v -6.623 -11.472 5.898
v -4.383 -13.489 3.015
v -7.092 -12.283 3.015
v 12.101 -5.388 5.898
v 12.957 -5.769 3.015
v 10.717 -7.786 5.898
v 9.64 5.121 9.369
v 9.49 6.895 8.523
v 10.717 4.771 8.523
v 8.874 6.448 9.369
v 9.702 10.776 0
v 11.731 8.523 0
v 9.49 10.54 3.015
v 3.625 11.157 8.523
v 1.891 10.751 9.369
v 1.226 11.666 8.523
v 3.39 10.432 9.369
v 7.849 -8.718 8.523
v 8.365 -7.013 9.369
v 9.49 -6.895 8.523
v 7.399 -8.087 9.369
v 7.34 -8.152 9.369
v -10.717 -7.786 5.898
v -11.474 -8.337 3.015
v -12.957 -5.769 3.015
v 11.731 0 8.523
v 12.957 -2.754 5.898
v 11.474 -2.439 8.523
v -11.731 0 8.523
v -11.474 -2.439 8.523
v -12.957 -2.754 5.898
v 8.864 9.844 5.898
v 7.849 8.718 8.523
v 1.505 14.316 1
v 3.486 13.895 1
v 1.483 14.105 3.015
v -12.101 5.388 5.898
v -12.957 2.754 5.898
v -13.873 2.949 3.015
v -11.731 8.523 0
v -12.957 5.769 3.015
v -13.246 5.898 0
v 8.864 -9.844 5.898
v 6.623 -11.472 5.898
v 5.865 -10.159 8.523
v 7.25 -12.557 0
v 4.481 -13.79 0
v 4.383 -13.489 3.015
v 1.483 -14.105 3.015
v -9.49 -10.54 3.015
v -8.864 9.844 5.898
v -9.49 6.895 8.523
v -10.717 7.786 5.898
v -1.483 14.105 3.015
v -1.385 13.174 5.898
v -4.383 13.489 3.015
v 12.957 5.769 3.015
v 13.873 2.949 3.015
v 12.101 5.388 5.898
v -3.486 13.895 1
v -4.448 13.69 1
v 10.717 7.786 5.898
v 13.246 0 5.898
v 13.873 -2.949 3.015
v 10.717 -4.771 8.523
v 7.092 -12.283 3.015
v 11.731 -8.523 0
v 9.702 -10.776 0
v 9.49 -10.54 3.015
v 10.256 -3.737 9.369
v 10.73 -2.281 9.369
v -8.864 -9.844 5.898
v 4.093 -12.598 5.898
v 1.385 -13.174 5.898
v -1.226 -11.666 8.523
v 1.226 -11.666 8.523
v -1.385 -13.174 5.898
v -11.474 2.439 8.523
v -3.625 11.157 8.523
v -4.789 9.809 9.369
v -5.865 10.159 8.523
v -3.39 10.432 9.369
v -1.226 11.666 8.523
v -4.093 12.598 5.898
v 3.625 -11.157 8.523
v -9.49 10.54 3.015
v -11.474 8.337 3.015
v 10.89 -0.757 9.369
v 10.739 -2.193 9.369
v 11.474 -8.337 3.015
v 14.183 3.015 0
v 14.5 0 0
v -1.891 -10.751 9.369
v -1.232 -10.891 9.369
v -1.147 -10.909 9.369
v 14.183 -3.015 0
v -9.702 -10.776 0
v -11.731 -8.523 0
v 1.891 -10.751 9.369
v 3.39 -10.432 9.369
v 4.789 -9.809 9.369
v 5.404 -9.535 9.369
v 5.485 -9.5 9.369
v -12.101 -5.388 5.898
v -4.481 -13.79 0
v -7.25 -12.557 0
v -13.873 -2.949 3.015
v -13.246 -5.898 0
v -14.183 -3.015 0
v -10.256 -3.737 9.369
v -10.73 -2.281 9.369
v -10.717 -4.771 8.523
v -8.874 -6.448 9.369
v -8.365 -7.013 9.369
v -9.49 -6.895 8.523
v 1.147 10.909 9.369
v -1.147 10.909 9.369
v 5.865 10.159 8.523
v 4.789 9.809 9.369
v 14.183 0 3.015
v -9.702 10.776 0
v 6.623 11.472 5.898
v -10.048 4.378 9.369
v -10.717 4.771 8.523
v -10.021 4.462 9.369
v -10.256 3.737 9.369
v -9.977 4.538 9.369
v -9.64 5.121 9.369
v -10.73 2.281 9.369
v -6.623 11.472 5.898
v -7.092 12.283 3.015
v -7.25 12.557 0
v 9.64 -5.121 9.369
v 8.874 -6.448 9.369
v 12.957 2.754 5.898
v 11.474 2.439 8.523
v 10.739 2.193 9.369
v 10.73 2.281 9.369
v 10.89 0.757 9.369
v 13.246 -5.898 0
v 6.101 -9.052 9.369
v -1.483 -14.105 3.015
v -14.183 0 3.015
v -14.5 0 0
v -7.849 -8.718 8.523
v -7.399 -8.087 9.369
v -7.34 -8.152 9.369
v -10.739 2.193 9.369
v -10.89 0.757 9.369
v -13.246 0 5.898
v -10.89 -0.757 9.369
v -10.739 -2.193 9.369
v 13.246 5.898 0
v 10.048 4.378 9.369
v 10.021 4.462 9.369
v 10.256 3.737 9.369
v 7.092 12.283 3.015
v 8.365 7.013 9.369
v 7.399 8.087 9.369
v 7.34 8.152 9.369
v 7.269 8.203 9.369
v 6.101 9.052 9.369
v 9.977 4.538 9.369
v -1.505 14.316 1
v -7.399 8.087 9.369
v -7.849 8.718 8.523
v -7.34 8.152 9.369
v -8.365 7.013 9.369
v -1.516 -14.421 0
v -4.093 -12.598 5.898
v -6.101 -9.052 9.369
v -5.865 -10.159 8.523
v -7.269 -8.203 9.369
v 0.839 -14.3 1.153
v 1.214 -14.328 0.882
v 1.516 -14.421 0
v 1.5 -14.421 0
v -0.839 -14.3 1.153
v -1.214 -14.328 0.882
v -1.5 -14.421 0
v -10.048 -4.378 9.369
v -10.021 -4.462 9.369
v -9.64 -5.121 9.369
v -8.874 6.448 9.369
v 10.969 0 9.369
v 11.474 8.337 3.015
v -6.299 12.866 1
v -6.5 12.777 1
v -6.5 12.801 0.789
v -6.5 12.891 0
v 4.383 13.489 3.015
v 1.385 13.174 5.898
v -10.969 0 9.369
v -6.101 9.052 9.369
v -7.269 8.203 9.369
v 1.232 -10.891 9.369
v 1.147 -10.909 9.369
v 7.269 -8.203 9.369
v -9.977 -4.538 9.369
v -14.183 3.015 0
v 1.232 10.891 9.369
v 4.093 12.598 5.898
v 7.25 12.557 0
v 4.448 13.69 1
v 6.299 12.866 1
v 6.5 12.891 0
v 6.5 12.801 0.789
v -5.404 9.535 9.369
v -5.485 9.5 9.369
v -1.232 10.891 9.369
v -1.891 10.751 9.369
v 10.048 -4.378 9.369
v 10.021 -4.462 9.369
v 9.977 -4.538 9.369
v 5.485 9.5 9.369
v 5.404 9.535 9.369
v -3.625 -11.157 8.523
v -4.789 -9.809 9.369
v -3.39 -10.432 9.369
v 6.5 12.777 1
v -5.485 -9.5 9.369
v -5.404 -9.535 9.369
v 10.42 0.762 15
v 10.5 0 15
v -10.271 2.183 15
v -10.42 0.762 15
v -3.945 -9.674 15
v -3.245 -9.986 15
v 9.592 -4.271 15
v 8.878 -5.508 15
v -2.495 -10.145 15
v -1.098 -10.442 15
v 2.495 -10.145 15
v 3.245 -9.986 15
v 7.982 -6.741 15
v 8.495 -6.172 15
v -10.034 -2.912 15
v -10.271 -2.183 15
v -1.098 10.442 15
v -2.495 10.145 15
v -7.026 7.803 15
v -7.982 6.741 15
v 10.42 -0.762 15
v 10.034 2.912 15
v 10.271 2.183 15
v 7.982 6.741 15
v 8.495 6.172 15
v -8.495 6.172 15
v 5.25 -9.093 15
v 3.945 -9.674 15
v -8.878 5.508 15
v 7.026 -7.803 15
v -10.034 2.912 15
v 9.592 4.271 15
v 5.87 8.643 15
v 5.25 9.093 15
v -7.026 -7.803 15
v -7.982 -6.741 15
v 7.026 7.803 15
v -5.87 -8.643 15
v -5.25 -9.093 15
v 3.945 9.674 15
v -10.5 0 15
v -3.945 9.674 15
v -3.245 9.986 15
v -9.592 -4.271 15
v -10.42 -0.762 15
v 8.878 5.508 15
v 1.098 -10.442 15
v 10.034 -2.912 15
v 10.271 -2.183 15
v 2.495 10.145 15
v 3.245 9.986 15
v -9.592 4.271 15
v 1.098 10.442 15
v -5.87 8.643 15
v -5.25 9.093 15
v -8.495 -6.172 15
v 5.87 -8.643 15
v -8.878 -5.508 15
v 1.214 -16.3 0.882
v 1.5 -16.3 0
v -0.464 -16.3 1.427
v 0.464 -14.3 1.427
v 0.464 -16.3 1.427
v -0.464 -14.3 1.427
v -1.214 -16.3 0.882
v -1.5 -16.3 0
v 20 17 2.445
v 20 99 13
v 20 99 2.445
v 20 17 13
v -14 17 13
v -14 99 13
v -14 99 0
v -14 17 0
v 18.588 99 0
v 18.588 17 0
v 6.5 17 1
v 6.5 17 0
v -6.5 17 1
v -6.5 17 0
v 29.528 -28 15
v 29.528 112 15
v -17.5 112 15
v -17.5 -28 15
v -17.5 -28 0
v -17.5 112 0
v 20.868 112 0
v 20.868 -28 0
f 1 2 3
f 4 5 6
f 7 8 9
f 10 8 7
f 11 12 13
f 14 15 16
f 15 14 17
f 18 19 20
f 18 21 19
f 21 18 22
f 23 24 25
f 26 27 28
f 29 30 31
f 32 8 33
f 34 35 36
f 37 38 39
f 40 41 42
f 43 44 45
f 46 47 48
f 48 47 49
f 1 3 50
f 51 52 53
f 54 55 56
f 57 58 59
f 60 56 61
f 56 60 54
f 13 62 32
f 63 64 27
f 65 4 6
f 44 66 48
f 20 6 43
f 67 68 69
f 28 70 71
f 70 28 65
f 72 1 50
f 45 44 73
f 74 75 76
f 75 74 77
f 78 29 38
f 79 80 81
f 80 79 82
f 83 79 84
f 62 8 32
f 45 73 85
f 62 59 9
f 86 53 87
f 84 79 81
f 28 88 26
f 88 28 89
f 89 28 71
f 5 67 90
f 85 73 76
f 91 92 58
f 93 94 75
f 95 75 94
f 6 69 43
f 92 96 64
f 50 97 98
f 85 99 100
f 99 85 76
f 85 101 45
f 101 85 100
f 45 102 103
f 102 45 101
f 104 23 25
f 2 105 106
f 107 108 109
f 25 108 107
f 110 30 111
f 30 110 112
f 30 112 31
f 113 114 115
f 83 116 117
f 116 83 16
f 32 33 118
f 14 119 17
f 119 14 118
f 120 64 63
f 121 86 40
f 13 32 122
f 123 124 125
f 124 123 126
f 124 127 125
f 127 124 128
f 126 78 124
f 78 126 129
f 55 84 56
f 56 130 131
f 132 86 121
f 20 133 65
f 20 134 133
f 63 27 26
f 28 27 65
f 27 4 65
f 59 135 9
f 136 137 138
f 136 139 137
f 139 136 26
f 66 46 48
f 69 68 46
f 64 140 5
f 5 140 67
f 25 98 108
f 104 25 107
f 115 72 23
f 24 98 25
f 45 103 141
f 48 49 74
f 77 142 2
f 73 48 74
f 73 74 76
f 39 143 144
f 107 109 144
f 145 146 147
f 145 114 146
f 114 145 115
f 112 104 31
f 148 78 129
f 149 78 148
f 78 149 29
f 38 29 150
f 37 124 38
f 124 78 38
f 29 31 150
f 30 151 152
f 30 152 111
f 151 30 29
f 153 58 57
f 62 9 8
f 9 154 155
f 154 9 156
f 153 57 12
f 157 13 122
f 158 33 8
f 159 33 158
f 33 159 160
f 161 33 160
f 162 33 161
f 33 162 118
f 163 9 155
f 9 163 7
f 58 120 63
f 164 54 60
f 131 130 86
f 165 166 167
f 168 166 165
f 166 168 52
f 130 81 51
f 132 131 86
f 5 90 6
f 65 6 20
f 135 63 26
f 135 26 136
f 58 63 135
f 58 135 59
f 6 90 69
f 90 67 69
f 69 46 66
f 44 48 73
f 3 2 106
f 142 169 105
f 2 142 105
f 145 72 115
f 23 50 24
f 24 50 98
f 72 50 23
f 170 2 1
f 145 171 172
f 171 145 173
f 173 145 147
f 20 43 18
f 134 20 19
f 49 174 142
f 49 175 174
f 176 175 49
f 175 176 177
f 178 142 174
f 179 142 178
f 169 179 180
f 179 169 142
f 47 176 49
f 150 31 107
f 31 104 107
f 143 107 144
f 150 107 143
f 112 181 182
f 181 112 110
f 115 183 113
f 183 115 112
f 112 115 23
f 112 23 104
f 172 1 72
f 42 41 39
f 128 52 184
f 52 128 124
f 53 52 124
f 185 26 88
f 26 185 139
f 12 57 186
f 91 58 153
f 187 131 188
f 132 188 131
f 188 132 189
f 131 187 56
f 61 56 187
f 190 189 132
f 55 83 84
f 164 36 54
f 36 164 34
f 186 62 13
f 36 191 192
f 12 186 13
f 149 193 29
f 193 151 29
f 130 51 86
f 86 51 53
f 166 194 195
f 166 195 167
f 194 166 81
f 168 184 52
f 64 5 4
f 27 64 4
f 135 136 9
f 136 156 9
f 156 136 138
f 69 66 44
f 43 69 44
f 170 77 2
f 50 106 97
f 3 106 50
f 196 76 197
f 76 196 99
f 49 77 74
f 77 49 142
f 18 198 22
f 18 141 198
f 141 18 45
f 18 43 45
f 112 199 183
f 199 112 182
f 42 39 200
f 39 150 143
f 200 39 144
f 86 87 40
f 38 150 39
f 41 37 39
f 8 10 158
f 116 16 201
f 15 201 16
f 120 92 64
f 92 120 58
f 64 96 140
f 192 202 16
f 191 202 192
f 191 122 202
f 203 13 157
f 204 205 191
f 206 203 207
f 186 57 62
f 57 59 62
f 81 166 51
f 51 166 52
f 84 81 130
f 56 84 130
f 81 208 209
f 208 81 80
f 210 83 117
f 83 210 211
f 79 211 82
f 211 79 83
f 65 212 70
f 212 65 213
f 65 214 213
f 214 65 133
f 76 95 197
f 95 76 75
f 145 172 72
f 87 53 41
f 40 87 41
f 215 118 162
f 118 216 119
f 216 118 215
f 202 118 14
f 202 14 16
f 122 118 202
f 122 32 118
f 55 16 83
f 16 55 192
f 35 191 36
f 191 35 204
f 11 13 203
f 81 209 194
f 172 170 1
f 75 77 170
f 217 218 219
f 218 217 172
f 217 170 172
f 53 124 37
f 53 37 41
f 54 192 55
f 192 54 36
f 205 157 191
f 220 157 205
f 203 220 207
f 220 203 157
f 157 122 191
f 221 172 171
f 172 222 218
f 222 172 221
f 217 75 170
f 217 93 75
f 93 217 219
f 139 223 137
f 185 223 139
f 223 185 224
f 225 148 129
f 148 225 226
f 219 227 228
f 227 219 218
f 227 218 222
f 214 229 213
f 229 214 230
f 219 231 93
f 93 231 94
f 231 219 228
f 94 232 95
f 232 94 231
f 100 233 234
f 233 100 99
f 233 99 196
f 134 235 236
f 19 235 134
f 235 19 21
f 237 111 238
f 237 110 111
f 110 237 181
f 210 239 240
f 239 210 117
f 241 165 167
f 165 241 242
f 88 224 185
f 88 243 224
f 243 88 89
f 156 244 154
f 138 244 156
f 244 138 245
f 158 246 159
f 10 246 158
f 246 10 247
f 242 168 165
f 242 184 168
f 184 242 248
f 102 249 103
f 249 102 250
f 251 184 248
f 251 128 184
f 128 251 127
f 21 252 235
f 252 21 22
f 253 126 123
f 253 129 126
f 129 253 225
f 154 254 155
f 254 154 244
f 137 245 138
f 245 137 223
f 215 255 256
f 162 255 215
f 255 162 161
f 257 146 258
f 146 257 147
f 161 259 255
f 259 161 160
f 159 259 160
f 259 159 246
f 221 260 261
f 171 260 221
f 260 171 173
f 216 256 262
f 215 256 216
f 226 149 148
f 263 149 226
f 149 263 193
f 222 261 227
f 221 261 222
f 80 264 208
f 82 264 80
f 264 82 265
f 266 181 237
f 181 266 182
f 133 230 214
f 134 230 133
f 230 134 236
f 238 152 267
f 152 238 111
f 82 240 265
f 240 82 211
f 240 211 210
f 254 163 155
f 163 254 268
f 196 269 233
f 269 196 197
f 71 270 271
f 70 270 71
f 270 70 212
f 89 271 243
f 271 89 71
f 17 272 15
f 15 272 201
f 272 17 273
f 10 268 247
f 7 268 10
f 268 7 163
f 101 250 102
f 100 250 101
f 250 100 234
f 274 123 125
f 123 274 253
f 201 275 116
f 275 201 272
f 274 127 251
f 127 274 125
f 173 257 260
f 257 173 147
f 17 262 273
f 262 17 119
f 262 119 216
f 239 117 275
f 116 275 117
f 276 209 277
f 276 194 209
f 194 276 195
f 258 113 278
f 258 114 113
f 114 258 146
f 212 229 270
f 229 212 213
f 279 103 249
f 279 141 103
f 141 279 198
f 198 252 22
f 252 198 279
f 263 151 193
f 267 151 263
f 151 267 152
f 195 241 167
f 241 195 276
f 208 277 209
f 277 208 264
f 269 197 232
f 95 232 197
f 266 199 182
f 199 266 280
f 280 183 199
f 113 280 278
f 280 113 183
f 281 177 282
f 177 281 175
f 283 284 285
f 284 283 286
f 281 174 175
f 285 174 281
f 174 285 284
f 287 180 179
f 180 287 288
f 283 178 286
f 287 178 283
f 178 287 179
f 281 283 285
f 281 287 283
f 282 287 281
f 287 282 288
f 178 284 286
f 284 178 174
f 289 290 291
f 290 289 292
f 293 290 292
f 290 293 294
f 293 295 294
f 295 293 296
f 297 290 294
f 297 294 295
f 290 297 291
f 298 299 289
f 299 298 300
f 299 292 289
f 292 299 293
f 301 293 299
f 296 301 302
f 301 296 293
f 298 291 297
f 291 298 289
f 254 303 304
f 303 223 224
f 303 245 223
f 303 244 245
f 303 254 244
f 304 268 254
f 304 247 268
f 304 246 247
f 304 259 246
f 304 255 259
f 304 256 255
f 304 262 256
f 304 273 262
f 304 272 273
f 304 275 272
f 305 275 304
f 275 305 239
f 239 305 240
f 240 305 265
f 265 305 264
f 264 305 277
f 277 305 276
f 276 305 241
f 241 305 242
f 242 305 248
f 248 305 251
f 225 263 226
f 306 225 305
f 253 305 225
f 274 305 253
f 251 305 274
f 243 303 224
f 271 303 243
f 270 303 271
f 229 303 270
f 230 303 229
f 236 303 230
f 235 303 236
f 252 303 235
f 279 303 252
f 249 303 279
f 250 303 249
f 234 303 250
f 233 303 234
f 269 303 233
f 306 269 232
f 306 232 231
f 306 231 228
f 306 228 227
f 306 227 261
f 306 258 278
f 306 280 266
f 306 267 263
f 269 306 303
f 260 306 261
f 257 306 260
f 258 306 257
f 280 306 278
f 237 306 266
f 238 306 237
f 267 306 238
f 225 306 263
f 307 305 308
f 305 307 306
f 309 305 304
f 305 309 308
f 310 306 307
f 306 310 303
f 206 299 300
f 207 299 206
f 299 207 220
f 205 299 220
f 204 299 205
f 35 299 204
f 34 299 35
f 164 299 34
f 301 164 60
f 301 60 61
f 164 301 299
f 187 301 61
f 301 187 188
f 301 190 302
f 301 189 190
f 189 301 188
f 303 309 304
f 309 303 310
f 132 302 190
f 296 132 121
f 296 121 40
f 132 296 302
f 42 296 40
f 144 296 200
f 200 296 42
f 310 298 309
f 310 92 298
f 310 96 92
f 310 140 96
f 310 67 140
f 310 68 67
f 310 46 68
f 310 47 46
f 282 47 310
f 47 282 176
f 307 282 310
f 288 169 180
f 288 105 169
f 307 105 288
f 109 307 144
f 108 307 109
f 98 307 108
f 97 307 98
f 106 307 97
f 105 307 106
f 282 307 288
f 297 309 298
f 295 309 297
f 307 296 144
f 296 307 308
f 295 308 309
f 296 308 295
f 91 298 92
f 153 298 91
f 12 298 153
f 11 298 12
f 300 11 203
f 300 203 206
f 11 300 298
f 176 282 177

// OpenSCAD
//
// ktCAM2
//

gap1 = 0.001;
gap2 = 0.002;

circle = 76;
panel_thick = 2;

A = 0;
B = 1;





difference()
{
    translate( [-35/2, -18-10, -20-10] ) cube( [35+25, 140, 35+10] );
    MAIN_CAM();
    //inner
    translate( [-13/2, -5, -14] ) cube( [13, 30, 15] );
    difference()
    {
        translate( [-14, 17, -27] ) cube( [34, 82, 40] );
        translate( [-10+13, 17, -27] ) rotate( [0, 30, 0] ) cube( [30, 82, 40] );
        translate( [-10, 17, -55] ) rotate( [0, 30-90, 0] ) cube( [30, 82, 40] );
    }
    //outer
    translate( [-8, -30, -50] ) rotate( [0, 30, 0] ) cube( [50, 180, 100] );
    translate( [-10, -30, -80] ) rotate( [0, 30-90, 0] ) cube( [50, 180, 100] );
    
    translate( [-20, -30, -50] ) cube( [50, 180, 50] );
    //translate( [0, -150, -80] ) rotate( [0, 0, 0] ) cube( [300, 300, 300] );
}





module MAIN_CAM()
{
    difference()
    {
        union()
        {
            sphere(r = 29/2);
            translate( [0, 0, 9] ) cylinder( 9, 22/2, 20.5/2 );
            translate( [0, -14.3, 0] ) rotate( [90, 0, 0] ) cylinder( 2, 3/2, 3/2, $fn=10 );
        }
        translate( [0, 0, -8-34/2] ) cube( [30, 30, 30], center=true);
    }
}
